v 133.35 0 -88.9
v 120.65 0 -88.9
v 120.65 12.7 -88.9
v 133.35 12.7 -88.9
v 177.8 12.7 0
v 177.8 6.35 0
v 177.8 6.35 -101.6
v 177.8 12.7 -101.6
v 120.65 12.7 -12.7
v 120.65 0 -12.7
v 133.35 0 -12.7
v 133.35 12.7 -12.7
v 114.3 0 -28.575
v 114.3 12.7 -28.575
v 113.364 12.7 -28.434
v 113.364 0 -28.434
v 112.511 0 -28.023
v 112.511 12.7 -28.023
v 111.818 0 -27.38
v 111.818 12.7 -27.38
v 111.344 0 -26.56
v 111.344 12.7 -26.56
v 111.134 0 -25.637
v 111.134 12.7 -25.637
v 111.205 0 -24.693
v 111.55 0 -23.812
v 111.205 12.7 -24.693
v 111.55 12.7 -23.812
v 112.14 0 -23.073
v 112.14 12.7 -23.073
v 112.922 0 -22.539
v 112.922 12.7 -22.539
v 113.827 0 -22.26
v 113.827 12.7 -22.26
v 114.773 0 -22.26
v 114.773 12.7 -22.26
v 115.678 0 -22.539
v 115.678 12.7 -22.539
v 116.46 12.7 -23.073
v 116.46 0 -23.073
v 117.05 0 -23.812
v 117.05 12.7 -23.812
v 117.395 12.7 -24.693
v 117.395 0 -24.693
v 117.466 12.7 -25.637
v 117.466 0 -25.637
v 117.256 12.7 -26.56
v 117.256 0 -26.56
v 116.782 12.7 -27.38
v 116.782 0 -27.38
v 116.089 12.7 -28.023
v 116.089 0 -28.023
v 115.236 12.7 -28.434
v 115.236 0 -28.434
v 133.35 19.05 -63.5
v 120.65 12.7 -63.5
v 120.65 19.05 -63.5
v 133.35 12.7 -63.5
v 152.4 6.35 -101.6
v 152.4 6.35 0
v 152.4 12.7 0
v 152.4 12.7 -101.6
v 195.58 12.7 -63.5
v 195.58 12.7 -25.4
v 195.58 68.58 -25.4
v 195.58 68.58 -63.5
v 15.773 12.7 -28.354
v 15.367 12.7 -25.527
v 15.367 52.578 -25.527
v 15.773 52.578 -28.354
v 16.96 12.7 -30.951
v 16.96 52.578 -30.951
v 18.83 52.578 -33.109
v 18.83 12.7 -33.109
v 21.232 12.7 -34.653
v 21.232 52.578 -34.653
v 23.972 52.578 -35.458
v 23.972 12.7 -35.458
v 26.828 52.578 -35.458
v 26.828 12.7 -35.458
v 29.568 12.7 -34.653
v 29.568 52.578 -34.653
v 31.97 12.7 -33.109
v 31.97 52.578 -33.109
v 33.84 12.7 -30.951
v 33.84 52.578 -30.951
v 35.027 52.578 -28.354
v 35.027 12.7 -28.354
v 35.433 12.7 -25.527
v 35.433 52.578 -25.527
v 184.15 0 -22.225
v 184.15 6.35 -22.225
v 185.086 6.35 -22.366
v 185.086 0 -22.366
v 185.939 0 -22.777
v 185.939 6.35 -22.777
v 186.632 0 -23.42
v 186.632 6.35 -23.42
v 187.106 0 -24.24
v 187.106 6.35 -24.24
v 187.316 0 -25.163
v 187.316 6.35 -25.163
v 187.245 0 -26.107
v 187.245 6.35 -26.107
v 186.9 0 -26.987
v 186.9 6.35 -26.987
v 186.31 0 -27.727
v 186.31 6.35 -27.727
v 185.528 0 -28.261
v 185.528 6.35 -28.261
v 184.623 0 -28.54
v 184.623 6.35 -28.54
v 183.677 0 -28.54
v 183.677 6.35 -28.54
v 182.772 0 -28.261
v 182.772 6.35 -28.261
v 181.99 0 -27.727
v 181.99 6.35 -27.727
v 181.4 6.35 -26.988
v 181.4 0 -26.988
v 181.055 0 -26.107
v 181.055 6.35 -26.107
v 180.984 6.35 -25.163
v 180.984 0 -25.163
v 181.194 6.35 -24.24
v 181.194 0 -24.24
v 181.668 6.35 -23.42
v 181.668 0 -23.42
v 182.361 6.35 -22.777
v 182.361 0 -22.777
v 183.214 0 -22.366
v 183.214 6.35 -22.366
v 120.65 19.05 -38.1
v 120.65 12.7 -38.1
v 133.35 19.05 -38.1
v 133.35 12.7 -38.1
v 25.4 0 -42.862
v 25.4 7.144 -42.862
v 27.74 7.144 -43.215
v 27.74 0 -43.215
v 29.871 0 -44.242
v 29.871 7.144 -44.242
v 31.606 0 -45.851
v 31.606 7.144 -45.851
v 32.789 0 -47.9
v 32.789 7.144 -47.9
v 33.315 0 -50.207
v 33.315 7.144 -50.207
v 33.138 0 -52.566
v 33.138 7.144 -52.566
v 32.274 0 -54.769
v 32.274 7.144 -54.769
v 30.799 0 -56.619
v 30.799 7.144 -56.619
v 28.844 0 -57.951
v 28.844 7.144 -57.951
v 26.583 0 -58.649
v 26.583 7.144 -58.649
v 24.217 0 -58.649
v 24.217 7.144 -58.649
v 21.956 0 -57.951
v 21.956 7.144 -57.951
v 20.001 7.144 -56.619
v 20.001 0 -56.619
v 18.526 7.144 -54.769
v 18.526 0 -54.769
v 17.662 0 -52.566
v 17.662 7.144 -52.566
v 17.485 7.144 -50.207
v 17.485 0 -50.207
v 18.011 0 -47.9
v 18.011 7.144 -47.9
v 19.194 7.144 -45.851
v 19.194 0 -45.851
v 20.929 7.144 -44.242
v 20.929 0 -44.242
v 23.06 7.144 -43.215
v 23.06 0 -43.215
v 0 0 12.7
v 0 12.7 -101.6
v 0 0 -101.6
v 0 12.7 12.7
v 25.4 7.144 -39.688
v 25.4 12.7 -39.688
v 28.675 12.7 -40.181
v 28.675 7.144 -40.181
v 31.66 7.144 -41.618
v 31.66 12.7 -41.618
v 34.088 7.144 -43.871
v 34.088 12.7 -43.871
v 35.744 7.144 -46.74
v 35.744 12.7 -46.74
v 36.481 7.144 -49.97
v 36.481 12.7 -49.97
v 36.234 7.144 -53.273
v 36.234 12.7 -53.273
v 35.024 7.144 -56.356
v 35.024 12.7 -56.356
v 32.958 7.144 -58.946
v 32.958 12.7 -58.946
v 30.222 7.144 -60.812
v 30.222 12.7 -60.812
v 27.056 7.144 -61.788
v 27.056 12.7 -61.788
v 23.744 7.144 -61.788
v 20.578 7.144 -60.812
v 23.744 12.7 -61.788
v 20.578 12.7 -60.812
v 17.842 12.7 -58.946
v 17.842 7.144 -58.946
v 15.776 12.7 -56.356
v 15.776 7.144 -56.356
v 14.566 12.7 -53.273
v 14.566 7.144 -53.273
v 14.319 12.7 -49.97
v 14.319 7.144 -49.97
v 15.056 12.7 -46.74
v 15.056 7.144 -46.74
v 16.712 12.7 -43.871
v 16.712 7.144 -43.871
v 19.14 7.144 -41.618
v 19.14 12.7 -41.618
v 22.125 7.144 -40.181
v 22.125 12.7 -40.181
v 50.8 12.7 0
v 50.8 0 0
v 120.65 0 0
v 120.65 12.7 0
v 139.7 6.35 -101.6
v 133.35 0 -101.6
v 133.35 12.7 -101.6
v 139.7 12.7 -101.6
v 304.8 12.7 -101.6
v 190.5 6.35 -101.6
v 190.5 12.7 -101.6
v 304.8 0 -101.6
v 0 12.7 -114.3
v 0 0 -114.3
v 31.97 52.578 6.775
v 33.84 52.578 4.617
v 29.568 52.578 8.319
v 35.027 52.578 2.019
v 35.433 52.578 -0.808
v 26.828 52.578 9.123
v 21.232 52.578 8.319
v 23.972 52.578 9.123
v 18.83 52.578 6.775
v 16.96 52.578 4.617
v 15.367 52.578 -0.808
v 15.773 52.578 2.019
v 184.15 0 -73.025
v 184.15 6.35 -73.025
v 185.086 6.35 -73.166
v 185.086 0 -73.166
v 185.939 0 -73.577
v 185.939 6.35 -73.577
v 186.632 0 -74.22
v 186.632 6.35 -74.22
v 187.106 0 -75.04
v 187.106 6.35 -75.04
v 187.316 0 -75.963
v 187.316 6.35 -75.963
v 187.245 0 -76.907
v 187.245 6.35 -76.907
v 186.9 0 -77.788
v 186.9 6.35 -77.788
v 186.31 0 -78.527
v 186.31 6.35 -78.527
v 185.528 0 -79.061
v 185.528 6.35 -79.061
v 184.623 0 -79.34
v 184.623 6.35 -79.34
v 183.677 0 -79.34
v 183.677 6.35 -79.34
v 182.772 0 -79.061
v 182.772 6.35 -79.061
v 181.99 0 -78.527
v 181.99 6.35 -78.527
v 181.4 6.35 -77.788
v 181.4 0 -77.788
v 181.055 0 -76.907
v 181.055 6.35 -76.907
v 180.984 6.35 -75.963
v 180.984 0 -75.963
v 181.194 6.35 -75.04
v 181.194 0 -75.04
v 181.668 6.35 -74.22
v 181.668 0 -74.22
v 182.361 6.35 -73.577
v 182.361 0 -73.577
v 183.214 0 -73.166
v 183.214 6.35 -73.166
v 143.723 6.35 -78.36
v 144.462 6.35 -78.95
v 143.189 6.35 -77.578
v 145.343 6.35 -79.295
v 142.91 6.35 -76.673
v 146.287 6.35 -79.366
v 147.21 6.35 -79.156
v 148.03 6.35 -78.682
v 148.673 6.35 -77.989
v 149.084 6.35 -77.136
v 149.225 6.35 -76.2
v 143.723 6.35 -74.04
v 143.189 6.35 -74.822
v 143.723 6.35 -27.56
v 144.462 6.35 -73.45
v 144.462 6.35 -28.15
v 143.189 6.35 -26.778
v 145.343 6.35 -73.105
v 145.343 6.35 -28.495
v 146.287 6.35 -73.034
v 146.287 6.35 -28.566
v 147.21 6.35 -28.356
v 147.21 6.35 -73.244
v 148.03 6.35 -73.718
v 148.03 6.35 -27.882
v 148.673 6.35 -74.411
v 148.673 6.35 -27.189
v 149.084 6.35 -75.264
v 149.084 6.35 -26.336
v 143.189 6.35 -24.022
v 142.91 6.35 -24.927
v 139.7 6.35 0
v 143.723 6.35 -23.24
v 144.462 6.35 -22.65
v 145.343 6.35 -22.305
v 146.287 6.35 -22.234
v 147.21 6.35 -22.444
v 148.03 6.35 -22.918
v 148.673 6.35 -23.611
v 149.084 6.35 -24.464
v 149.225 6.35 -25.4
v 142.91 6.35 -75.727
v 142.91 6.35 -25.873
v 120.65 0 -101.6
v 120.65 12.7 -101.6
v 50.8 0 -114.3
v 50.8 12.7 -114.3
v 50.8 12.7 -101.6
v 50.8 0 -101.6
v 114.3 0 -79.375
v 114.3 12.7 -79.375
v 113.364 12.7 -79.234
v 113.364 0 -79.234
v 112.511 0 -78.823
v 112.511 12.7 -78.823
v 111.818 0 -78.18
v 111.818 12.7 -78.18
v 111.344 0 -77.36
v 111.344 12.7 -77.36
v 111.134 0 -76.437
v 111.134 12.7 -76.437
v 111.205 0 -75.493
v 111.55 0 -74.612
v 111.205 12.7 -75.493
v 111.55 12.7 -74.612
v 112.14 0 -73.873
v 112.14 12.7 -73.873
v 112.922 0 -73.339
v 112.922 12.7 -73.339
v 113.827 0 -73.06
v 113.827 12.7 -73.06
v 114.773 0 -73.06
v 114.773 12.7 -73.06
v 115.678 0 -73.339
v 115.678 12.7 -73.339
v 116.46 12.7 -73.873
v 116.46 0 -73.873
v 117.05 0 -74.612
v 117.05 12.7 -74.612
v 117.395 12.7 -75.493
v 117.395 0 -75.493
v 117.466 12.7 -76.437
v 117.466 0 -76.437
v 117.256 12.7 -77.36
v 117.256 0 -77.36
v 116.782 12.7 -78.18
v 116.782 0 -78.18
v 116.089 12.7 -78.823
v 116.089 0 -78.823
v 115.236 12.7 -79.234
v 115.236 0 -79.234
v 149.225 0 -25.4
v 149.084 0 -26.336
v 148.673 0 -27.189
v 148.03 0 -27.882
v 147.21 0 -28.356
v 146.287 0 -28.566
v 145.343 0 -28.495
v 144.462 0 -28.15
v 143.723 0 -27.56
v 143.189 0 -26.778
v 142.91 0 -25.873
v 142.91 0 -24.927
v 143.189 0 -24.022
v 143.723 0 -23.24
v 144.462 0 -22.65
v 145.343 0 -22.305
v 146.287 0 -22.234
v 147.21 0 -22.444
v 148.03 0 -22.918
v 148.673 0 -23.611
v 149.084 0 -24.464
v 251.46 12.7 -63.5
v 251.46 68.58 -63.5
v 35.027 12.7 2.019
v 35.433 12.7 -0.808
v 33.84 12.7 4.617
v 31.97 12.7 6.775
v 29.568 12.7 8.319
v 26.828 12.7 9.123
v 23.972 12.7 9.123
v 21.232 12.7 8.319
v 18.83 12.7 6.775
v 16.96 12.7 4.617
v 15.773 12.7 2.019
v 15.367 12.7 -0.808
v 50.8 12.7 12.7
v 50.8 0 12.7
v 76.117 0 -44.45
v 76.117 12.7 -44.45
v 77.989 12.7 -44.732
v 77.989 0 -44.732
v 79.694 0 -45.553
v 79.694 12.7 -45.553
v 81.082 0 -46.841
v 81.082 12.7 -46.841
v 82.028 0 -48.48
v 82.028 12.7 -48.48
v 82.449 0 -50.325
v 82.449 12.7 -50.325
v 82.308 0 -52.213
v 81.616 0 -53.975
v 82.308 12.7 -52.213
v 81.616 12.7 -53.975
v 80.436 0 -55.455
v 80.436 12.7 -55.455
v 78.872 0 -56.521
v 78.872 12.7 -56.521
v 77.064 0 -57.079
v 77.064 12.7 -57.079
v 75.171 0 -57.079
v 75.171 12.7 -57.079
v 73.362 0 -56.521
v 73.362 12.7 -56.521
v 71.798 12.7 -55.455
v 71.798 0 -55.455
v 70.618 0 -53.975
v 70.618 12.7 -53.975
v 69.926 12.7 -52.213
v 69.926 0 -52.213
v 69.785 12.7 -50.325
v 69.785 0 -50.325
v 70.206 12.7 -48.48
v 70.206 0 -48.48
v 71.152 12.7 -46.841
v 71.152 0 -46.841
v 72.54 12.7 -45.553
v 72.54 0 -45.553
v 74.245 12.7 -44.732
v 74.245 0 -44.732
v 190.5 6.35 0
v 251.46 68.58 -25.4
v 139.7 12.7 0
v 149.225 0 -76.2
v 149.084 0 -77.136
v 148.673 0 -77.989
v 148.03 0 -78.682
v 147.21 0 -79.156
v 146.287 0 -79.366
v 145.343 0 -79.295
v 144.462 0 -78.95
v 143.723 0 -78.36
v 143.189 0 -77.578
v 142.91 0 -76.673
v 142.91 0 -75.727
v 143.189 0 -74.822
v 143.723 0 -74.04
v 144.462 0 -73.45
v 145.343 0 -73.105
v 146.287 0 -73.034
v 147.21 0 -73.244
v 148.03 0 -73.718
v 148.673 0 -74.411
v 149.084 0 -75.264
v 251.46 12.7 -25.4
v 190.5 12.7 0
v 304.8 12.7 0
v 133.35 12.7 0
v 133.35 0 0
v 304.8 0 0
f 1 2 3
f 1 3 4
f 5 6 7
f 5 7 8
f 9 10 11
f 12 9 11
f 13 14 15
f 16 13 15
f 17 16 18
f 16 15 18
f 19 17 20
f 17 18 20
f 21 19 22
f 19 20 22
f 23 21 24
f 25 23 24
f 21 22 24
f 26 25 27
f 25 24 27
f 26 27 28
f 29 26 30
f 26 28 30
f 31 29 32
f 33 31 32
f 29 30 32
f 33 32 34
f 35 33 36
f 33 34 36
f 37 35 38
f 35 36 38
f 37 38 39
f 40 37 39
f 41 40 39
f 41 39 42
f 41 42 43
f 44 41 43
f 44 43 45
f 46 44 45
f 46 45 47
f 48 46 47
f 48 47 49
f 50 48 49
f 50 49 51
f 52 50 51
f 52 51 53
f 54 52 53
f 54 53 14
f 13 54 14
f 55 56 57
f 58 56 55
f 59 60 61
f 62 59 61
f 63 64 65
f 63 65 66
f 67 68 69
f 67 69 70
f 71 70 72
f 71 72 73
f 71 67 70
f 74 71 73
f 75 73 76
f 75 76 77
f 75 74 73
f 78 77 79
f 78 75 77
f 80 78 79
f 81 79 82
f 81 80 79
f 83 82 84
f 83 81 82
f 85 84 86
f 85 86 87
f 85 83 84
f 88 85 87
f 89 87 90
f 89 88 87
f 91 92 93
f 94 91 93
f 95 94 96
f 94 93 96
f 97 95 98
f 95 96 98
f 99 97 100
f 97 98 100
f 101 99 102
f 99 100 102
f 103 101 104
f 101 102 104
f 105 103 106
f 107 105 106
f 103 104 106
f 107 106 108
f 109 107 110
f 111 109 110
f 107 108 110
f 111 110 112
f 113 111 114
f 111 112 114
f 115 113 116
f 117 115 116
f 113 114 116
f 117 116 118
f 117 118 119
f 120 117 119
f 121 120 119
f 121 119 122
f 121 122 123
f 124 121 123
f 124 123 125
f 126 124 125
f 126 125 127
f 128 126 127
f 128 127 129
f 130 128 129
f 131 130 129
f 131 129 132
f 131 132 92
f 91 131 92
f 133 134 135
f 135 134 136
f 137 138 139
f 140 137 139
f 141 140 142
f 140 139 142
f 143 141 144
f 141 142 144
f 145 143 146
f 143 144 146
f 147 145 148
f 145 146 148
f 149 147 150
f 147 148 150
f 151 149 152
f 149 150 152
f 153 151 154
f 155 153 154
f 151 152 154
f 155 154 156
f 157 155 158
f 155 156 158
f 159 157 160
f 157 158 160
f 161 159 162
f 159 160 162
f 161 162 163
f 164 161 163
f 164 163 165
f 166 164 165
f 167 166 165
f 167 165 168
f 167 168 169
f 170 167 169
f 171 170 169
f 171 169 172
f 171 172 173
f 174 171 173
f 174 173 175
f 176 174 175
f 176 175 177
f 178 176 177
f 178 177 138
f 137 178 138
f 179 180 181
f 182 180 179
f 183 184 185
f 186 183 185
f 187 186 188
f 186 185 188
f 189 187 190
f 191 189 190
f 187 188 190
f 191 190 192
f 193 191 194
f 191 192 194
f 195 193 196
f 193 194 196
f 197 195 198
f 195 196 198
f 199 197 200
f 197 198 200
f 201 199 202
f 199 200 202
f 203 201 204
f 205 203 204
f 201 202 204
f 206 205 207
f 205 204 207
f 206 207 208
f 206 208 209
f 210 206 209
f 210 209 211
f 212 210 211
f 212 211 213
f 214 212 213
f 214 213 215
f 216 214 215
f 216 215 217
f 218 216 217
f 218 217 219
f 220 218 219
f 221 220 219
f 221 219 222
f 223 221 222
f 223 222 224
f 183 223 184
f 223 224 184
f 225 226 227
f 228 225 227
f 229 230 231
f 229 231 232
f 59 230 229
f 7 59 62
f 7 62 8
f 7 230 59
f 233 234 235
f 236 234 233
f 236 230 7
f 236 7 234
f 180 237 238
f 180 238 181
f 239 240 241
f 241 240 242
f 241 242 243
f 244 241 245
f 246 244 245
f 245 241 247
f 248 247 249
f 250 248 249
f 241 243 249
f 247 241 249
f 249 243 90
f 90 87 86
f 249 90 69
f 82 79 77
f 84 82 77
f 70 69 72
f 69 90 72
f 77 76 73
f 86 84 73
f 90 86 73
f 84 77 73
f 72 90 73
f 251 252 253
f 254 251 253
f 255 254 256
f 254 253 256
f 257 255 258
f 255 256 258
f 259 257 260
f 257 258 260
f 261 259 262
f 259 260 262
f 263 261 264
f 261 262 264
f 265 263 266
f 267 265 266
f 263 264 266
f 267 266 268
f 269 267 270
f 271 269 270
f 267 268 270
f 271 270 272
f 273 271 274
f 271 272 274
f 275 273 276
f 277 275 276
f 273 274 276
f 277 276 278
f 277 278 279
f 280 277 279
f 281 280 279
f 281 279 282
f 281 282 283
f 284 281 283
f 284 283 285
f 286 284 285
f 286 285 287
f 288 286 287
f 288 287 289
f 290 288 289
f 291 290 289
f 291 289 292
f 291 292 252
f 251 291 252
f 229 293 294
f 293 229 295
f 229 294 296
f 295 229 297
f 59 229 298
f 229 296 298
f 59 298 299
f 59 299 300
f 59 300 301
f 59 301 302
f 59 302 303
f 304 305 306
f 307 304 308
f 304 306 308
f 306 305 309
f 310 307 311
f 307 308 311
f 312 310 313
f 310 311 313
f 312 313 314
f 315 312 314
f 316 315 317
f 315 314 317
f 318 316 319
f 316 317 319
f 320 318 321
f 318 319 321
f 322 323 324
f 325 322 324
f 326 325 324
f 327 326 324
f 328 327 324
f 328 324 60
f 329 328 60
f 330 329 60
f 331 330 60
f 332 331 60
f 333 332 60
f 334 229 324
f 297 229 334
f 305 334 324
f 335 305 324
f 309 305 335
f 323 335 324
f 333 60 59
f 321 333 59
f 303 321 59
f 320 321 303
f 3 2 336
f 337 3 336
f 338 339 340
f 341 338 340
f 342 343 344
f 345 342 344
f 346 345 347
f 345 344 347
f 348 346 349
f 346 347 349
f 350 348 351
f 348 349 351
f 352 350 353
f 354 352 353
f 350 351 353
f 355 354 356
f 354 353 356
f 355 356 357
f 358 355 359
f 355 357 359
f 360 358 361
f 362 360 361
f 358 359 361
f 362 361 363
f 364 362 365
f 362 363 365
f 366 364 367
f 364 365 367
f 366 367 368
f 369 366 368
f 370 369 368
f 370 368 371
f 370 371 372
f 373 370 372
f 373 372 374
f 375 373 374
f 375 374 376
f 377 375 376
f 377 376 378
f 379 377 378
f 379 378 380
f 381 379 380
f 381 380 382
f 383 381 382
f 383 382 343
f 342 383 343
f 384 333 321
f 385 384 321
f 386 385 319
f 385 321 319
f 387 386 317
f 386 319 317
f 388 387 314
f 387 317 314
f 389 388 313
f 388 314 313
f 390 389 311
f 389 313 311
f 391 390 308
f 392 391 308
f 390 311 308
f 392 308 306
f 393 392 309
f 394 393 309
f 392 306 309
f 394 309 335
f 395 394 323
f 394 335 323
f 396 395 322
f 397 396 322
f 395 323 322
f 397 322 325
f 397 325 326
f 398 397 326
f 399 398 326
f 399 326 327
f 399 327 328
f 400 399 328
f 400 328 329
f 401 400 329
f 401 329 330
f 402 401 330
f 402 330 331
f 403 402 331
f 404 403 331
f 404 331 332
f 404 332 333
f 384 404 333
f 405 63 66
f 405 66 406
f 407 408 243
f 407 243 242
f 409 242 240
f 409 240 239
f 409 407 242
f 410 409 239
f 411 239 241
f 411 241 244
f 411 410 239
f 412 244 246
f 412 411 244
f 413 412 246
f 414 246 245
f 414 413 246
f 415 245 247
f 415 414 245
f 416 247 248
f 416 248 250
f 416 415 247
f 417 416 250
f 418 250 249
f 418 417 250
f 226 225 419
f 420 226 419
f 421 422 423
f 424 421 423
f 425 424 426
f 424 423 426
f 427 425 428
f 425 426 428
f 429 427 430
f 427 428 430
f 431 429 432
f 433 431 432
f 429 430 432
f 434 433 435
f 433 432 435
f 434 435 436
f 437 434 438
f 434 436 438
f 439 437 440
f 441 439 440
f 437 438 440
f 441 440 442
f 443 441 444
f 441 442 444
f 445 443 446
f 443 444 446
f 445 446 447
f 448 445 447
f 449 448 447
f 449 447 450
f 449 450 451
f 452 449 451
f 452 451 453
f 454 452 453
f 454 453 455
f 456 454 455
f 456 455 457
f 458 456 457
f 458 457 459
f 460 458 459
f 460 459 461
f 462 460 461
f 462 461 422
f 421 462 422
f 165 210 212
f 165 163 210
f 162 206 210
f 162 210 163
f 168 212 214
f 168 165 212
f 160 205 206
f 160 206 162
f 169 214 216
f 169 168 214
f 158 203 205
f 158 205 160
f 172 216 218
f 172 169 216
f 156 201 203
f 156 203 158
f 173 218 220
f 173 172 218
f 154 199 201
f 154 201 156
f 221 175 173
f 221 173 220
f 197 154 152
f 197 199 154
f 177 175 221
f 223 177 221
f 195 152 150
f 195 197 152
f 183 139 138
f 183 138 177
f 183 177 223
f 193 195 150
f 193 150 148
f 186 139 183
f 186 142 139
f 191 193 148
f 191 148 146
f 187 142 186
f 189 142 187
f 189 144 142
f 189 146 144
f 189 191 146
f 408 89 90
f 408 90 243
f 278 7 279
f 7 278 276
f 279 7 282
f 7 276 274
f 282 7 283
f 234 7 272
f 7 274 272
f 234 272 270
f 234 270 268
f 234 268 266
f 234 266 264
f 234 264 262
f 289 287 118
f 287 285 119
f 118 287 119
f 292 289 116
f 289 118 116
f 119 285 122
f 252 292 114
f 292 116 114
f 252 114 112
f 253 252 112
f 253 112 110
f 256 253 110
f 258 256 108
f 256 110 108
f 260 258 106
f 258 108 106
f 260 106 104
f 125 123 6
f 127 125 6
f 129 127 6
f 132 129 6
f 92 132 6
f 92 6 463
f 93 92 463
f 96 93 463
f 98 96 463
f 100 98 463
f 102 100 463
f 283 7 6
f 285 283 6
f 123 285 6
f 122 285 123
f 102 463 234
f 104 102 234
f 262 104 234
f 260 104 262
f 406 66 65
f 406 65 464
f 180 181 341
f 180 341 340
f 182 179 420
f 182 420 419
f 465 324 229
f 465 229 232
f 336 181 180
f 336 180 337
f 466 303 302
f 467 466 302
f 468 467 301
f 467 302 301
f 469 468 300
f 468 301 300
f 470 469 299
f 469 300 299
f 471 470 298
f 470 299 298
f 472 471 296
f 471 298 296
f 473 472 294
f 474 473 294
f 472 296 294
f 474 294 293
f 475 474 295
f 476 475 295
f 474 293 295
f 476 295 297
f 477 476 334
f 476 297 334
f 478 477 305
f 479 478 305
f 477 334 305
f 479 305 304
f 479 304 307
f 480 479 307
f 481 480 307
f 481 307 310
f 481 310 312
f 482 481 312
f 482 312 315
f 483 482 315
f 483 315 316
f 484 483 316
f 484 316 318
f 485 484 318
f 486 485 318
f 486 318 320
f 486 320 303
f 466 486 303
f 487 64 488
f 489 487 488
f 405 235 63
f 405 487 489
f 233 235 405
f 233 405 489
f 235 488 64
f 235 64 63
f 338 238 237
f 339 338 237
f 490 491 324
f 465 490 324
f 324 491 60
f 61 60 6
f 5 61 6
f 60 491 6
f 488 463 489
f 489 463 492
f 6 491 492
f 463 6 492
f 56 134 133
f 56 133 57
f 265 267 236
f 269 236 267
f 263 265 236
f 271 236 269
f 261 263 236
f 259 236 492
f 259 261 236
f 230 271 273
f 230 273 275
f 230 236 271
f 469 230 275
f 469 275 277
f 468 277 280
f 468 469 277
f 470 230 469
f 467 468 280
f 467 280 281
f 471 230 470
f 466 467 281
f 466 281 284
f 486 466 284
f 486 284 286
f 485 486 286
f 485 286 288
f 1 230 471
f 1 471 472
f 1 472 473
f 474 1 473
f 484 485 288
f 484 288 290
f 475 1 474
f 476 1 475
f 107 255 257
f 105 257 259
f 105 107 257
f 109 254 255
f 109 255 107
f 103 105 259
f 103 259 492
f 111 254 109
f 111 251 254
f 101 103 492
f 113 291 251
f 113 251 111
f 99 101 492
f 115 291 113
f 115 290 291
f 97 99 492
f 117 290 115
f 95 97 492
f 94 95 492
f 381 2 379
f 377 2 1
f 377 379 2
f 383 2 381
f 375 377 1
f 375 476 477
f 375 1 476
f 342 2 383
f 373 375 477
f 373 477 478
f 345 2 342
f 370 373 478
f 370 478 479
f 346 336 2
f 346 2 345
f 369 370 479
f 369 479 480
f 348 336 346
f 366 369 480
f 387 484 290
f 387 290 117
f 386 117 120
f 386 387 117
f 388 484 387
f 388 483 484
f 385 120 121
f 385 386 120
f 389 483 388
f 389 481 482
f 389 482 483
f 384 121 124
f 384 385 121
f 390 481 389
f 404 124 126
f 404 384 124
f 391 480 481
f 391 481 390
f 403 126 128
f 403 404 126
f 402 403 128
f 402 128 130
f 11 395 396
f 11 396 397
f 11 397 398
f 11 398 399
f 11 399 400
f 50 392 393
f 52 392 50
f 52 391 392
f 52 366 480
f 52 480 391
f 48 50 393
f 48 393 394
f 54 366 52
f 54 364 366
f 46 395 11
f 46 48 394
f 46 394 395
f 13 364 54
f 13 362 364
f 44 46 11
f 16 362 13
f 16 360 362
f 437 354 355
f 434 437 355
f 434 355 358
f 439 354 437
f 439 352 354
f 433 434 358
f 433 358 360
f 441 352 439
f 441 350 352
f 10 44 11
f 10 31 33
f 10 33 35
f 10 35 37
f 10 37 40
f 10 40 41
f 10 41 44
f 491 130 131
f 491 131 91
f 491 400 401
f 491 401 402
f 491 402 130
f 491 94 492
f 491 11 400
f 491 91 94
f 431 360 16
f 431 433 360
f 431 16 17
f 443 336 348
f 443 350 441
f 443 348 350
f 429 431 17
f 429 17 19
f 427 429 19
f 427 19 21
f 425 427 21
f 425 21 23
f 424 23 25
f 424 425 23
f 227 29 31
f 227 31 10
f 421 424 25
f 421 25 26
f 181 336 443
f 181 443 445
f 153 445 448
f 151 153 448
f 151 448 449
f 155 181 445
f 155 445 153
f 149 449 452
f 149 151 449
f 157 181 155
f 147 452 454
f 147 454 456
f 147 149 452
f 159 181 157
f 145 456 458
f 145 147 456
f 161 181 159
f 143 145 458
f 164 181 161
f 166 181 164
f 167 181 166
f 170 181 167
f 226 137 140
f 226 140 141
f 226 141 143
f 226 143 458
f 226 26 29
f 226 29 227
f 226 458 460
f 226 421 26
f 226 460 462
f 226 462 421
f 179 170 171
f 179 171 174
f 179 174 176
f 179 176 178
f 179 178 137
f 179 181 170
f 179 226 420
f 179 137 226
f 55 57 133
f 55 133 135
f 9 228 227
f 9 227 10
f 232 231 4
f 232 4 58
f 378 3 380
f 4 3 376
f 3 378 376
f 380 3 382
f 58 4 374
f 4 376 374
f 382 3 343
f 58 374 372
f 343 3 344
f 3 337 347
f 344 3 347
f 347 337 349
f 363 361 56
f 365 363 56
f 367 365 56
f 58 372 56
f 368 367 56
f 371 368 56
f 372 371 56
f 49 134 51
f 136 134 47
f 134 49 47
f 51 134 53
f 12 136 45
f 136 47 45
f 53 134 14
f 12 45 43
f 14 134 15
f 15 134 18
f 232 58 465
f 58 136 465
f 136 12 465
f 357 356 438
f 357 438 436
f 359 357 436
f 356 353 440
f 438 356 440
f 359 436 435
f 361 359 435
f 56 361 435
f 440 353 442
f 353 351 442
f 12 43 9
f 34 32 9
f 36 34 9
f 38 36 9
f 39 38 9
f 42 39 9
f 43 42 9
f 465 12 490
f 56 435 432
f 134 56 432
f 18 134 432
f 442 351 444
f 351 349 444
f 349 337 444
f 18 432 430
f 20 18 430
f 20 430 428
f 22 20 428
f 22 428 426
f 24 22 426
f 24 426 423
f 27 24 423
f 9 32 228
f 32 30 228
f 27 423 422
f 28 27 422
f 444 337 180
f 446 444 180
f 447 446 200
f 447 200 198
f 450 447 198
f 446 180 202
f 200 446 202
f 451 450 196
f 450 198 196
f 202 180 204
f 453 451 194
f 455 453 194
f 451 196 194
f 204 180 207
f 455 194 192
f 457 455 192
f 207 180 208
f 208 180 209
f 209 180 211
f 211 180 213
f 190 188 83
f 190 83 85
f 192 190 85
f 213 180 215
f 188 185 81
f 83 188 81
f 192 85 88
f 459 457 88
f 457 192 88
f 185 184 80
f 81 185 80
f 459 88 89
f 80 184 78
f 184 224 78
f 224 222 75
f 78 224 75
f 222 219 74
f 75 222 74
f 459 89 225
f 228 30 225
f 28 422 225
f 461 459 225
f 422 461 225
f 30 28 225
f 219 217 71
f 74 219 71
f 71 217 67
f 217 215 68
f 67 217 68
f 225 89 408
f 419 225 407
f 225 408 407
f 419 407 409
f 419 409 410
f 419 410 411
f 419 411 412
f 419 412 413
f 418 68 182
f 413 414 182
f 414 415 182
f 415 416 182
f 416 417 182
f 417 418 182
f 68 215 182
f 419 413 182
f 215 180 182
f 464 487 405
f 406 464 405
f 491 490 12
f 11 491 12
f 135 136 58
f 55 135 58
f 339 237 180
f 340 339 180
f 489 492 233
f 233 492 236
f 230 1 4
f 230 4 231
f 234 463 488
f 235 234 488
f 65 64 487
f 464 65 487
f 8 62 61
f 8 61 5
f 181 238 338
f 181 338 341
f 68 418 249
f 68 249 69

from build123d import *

# Parameters (mm, degrees)
SKETCH1_W             = 304.8
SKETCH1_H             = 101.6
BOSS_EXTRUDE1_DEPTH   = 12.7
SKETCH3_R             = 11.1125
CUT_EXTRUDE2_DEPTH    = 5.55625
SKETCH9_W             = 12.7
SKETCH9_H             = 6.35
CUT_EXTRUDE5_DEPTH    = 322.53831809
CUT_EXTRUDE8_START    = 6.35
SKETCH15_R            = 3.175
CUT_EXTRUDE8_DEPTH    = 25.4
SKETCH17_W            = 55.88
SKETCH17_H            = 38.1
BOSS_EXTRUDE5_DEPTH   = 55.88
SKETCH20_W            = 12.7
SKETCH20_H            = 12.7
BOSS_EXTRUDE7_DEPTH   = 50.8
BOSS_EXTRUDE7_2_DEPTH = 50.8
SKETCH21_R            = 7.9375
CUT_EXTRUDE10_DEPTH   = 332.273214755
BOSS_EXTRUDE8_DEPTH   = 39.878
SKETCH23_R            = 6.35
CUT_EXTRUDE11_DEPTH   = 331.287911374
SKETCH24_W            = 12.7
SKETCH24_H            = 25.4
BOSS_EXTRUDE9_DEPTH   = 6.35
SKETCH25_W            = 12.7
SKETCH25_H            = 12.7
CUT_EXTRUDE12_DEPTH   = 331.287911374


with BuildPart() as part:
    # Sketch1 → Boss-Extrude1 (new body)
    with BuildSketch(Plane(origin=(0, 0, 0), x_dir=(1, 0, 0), z_dir=(0, 1, 0))):
        with Locations((152.4, 50.8)):
            Rectangle(SKETCH1_W, SKETCH1_H)
    extrude(amount=BOSS_EXTRUDE1_DEPTH)

    # Sketch3 → Cut-Extrude2 (cut)
    with BuildSketch(Plane(origin=(0, 12.7, 0), x_dir=(1, 0, 0), z_dir=(0, 1, 0))):
        with Locations(Location((25.4, 50.8, 0), (0, 0, 270))):
            Circle(SKETCH3_R)
    extrude(amount=-CUT_EXTRUDE2_DEPTH, mode=Mode.SUBTRACT)

    # Sketch9 → Cut-Extrude5 (cut, through all)
    with BuildSketch(Plane.XY):
        with Locations((146.05, 9.525)):
            Rectangle(SKETCH9_W, SKETCH9_H)
        with Locations((184.15, 9.525)):
            Rectangle(SKETCH9_W, SKETCH9_H)
    extrude(amount=-CUT_EXTRUDE5_DEPTH, mode=Mode.SUBTRACT)

    # Sketch15 → Cut-Extrude8 (cut)
    with BuildSketch(Plane(origin=(0, 6.35, 0), x_dir=(1, 0, 0), z_dir=(0, 1, 0)).offset(CUT_EXTRUDE8_START)):
        with Locations((146.05, 25.4)):
            Circle(SKETCH15_R)
        with Locations(Location((184.15, 76.2, 0), (0, 0, 270))):
            Circle(SKETCH15_R)
        with Locations(Location((184.15, 25.4, 0), (0, 0, 270))):
            Circle(SKETCH15_R)
        with Locations((146.05, 76.2)):
            Circle(SKETCH15_R)
        with Locations(Location((114.3, 25.4, 0), (0, 0, 90))):
            Circle(SKETCH15_R)
        with Locations(Location((114.3, 76.2, 0), (0, 0, 90))):
            Circle(SKETCH15_R)
    extrude(amount=-CUT_EXTRUDE8_DEPTH, mode=Mode.SUBTRACT)

    # Sketch17 → Boss-Extrude5 (add)
    with BuildSketch(Plane(origin=(0, 12.7, 0), x_dir=(1, 0, 0), z_dir=(0, 1, 0))):
        with Locations((223.52, 44.45)):
            Rectangle(SKETCH17_W, SKETCH17_H)
    extrude(amount=BOSS_EXTRUDE5_DEPTH)

    # Sketch21 → Cut-Extrude10 (cut, through all)
    with BuildSketch(Plane(origin=(0, 7.14375, 0), x_dir=(1, 0, 0), z_dir=(0, 1, 0))):
        with Locations(Location((25.4, 50.8, 0), (0, 0, 270))):
            Circle(SKETCH21_R)
    extrude(amount=-CUT_EXTRUDE10_DEPTH, mode=Mode.SUBTRACT)



with BuildPart() as body_2:
    # Sketch20 → Boss-Extrude7 (new body)
    with BuildSketch(Plane.ZY):
        with Locations((6.35, 6.35)):
            Rectangle(SKETCH20_W, SKETCH20_H)
    extrude(amount=-BOSS_EXTRUDE7_DEPTH)


with BuildPart() as body_3:
    # Sketch20 → Boss-Extrude7 2 (new body)
    with BuildSketch(Plane.ZY):
        with Locations((-107.95, 6.35)):
            Rectangle(SKETCH20_W, SKETCH20_H)
    extrude(amount=-BOSS_EXTRUDE7_2_DEPTH)


with BuildPart() as part_1:
    add(part.part)

    add(body_2.part)  # Boss-Extrude8 merges body 2
    # Sketch22 → Boss-Extrude8 (add)
    with BuildSketch(Plane(origin=(0, 12.7, 0), x_dir=(1, 0, 0), z_dir=(0, 1, 0))):
        with BuildLine():
            Line((35.433, 25.527), (35.433, 0.807734429))
            ThreePointArc((35.433, 0.807734429), (25.4, -9.225265571), (15.367, 0.807734429))
            Line((15.367, 0.807734429), (15.367, 25.527))
            ThreePointArc((15.367, 25.527), (25.4, 35.56), (35.433, 25.527))
        make_face()
    extrude(amount=BOSS_EXTRUDE8_DEPTH)

    # Sketch23 → Cut-Extrude11 (cut, through all)
    with BuildSketch(Plane(origin=(0, 12.7, 0), x_dir=(1, 0, 0), z_dir=(0, 1, 0))):
        with Locations(Location((76.117084071, 50.8, 0), (0, 0, 270))):
            Circle(SKETCH23_R)
    extrude(amount=-CUT_EXTRUDE11_DEPTH, mode=Mode.SUBTRACT)

    # Sketch24 → Boss-Extrude9 (add)
    with BuildSketch(Plane(origin=(0, 12.7, 0), x_dir=(1, 0, 0), z_dir=(0, 1, 0))):
        with Locations((127, 50.8)):
            Rectangle(SKETCH24_W, SKETCH24_H)
    extrude(amount=BOSS_EXTRUDE9_DEPTH)

    # Sketch25 → Cut-Extrude12 (cut, through all)
    with BuildSketch(Plane(origin=(0, 12.7, 0), x_dir=(1, 0, 0), z_dir=(0, 1, 0))):
        with Locations((127, 95.25)):
            Rectangle(SKETCH25_W, SKETCH25_H)
        with Locations((127, 6.35)):
            Rectangle(SKETCH25_W, SKETCH25_H)
    extrude(amount=-CUT_EXTRUDE12_DEPTH, mode=Mode.SUBTRACT)


solid = Compound([body_3.part, part_1.part])
